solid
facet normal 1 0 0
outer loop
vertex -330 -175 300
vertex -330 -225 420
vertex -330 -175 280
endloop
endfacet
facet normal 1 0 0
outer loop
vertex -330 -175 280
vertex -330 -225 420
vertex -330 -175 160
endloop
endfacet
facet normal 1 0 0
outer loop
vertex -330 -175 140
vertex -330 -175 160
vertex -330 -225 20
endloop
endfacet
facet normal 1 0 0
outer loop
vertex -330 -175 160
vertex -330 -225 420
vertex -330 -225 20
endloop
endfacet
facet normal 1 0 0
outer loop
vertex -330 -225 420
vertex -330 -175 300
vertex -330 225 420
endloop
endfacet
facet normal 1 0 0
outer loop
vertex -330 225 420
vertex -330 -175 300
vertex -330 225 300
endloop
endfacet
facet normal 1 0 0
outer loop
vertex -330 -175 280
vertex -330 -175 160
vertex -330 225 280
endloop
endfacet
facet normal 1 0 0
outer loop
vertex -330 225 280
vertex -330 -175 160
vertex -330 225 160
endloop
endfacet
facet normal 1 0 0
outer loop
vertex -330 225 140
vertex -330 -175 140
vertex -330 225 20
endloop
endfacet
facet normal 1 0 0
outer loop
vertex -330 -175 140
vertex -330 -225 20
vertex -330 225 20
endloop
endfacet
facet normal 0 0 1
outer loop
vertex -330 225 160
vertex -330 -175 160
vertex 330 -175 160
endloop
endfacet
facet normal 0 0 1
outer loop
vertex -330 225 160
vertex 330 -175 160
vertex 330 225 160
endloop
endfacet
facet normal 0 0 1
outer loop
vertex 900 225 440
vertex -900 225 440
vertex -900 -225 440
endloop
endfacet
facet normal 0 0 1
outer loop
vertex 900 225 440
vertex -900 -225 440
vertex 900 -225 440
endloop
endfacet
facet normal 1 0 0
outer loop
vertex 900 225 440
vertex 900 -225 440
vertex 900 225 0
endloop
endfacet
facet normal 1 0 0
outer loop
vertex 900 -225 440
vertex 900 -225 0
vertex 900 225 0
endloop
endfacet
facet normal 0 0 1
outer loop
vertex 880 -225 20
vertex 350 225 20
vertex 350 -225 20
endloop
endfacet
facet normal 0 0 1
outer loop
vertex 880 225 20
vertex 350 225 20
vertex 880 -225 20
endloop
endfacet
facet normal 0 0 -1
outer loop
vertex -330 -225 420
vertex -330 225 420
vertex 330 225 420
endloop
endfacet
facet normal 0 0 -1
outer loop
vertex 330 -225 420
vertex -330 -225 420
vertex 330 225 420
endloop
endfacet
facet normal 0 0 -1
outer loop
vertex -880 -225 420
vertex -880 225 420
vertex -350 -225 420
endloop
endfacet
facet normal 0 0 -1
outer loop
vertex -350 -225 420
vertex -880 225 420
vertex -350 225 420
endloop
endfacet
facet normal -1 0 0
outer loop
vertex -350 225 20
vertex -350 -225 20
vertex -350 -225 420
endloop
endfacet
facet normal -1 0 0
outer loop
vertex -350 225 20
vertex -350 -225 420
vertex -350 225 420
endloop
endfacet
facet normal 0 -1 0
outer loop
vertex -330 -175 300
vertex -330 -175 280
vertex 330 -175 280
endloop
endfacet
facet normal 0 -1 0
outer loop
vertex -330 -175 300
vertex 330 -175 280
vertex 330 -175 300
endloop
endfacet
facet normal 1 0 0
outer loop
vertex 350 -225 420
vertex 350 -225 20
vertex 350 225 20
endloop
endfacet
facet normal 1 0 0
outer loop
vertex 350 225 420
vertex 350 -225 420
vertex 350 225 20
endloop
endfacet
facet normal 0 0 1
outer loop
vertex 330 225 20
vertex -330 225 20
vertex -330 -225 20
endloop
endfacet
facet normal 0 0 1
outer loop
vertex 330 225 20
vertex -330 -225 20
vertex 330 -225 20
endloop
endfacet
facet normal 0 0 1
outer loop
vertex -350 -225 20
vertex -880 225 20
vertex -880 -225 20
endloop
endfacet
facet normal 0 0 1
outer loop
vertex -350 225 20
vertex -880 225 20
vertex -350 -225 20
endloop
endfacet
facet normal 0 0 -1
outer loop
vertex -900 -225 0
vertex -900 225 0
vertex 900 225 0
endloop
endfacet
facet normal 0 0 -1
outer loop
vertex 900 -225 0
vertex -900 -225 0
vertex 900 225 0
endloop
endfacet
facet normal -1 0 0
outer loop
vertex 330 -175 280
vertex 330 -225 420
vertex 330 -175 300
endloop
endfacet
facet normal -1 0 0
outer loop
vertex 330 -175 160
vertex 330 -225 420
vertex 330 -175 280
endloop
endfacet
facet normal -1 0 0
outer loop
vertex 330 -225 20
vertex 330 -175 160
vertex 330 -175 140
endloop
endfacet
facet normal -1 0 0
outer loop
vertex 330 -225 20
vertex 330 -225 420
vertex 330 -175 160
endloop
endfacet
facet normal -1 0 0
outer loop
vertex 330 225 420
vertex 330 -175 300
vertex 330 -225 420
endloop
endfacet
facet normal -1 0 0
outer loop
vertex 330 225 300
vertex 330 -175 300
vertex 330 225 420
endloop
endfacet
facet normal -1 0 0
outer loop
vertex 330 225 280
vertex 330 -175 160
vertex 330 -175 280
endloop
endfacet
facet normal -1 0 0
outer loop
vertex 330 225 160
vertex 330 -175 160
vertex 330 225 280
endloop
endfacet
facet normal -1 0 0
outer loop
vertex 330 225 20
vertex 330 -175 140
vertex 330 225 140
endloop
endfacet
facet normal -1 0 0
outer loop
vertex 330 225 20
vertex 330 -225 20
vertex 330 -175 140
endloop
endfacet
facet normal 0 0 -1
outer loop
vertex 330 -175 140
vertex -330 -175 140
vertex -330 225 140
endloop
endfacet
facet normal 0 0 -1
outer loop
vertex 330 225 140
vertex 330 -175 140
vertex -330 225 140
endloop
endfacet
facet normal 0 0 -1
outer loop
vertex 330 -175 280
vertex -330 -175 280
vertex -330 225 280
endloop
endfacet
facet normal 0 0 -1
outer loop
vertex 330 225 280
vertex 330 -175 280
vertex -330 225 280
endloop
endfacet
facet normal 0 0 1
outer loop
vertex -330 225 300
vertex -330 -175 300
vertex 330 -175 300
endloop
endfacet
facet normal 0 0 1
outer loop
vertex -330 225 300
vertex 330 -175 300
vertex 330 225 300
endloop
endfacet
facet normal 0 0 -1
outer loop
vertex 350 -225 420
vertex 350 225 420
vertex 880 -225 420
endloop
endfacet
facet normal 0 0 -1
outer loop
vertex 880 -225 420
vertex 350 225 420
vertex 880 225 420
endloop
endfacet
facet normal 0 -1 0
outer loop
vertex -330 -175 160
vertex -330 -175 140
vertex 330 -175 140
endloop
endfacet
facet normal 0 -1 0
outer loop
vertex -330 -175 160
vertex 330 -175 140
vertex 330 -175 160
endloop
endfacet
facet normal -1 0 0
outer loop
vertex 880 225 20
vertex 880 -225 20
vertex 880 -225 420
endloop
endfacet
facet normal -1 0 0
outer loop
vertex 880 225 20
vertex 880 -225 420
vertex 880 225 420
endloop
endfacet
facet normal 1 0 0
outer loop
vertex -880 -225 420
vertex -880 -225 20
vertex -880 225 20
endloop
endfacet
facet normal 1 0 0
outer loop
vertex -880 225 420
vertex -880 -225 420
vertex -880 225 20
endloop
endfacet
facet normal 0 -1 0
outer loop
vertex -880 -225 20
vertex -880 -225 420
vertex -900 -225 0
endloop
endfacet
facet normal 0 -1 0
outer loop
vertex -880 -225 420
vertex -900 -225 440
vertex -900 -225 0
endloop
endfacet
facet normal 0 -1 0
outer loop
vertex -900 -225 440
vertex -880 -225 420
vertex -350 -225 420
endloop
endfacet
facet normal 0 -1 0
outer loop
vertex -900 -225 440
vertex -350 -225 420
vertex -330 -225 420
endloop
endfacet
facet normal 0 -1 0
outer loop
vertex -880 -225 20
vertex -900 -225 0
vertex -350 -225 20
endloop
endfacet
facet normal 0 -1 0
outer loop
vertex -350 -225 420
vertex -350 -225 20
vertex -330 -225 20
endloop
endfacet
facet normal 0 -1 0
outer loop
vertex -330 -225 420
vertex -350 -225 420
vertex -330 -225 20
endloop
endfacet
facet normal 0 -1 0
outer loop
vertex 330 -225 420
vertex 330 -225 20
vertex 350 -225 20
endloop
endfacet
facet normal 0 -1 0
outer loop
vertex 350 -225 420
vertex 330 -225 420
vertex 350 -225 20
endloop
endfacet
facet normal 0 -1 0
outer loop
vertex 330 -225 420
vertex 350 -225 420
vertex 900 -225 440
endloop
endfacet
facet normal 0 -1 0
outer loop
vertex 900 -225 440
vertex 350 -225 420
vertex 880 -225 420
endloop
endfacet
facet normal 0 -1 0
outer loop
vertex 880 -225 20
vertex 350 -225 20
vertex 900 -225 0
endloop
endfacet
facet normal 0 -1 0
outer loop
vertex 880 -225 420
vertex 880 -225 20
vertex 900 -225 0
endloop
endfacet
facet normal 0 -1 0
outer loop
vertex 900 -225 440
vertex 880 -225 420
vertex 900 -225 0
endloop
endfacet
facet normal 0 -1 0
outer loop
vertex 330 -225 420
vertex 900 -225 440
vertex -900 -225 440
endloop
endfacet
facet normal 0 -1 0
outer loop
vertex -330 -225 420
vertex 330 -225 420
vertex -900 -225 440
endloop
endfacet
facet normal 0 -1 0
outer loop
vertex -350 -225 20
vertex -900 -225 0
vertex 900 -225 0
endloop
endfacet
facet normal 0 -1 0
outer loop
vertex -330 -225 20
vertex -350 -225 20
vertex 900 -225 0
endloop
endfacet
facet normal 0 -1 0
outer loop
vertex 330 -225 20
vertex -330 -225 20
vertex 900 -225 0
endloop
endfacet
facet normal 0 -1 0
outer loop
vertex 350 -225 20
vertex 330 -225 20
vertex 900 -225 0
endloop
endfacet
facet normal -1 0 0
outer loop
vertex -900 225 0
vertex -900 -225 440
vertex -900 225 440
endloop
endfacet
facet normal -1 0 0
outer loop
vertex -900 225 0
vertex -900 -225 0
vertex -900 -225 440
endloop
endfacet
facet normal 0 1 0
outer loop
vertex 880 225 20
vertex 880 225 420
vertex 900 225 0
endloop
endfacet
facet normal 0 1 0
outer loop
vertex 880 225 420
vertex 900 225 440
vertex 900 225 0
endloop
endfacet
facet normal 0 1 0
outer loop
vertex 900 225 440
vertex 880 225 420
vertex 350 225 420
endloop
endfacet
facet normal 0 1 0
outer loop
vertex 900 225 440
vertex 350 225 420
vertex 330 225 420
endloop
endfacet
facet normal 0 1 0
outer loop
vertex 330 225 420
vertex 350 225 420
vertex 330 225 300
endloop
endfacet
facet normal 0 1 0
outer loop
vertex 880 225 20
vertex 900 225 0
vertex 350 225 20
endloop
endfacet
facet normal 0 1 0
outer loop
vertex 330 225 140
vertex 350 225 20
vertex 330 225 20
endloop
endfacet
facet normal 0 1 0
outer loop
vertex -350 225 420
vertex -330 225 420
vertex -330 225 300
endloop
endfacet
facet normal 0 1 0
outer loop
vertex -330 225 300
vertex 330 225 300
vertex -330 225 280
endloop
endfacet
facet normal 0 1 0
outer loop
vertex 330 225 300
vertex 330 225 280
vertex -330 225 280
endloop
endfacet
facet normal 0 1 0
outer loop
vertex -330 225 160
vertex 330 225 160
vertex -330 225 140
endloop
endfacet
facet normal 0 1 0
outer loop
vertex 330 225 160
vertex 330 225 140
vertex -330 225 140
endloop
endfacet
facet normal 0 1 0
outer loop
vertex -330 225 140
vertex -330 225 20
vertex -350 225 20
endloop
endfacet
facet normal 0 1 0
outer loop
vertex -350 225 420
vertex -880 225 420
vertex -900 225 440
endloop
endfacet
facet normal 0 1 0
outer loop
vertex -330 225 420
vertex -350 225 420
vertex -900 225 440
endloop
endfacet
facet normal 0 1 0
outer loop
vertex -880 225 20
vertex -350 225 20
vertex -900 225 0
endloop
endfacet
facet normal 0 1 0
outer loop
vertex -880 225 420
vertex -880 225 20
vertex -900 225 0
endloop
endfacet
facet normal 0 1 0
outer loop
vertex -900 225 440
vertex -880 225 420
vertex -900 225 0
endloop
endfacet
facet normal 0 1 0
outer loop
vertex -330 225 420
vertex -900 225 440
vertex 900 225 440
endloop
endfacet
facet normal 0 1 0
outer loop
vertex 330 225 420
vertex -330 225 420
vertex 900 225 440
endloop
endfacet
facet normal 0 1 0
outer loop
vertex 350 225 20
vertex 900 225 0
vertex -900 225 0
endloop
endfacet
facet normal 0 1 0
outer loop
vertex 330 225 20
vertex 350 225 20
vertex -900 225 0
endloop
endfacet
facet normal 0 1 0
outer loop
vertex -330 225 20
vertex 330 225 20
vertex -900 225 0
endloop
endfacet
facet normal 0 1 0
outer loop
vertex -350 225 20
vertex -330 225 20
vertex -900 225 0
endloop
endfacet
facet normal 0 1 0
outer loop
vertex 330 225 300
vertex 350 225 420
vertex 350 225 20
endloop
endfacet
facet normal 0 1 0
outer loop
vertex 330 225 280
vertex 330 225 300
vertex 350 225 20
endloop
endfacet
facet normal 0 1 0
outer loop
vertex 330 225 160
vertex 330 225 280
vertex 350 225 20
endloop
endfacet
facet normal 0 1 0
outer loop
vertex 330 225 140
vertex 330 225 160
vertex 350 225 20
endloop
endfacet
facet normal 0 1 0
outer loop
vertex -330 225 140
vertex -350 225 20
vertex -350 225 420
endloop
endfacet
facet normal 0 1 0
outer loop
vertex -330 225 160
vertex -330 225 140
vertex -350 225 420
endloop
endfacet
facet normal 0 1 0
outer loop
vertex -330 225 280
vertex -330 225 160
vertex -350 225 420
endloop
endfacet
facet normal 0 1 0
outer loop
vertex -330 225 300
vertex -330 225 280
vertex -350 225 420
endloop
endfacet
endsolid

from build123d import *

# Parameters (mm, degrees)
F0_W     = 1800
F0_H     = 450
F1_DEPTH = 20
F2_W     = 20
F2_H     = 450
F3_DEPTH = 400
F4_W     = 1780
F4_H     = 450
F4_W_2   = 20
F5_DEPTH = 20
F6_W     = 400
F6_H     = 20
F7_DEPTH = 660


with BuildPart() as f1:
    # F0 (on Top) → F1 (new body)
    with BuildSketch(Plane.XY):
        Rectangle(F0_W, F0_H)
    extrude(amount=F1_DEPTH)

    # F2 (on face) → F3 (join)
    with BuildSketch(Plane.XY.offset(20)):
        with Locations((-890, 0)):
            Rectangle(F2_W, F2_H)
        with Locations((890, 0)):
            Rectangle(F2_W, F2_H)
        with Locations((340, 0)):
            Rectangle(F2_W, F2_H)
        with Locations((-340, 0)):
            Rectangle(F2_W, F2_H)
    extrude(amount=F3_DEPTH)

    # F4 (on face) → F5 (join)
    with BuildSketch(Plane.XY.offset(420)):
        with Locations((-10, 0)):
            Rectangle(F4_W, F4_H)
        with Locations((890, 0)):
            Rectangle(F4_W_2, F4_H)
    extrude(amount=F5_DEPTH)

    # F6 (on face) → F7 (join)
    with BuildSketch(Plane.YZ.offset(-330)):
        with Locations((25, 150)):
            Rectangle(F6_W, F6_H)
        with Locations((25, 290)):
            Rectangle(F6_W, F6_H)
    extrude(amount=F7_DEPTH)


solid = f1.part
